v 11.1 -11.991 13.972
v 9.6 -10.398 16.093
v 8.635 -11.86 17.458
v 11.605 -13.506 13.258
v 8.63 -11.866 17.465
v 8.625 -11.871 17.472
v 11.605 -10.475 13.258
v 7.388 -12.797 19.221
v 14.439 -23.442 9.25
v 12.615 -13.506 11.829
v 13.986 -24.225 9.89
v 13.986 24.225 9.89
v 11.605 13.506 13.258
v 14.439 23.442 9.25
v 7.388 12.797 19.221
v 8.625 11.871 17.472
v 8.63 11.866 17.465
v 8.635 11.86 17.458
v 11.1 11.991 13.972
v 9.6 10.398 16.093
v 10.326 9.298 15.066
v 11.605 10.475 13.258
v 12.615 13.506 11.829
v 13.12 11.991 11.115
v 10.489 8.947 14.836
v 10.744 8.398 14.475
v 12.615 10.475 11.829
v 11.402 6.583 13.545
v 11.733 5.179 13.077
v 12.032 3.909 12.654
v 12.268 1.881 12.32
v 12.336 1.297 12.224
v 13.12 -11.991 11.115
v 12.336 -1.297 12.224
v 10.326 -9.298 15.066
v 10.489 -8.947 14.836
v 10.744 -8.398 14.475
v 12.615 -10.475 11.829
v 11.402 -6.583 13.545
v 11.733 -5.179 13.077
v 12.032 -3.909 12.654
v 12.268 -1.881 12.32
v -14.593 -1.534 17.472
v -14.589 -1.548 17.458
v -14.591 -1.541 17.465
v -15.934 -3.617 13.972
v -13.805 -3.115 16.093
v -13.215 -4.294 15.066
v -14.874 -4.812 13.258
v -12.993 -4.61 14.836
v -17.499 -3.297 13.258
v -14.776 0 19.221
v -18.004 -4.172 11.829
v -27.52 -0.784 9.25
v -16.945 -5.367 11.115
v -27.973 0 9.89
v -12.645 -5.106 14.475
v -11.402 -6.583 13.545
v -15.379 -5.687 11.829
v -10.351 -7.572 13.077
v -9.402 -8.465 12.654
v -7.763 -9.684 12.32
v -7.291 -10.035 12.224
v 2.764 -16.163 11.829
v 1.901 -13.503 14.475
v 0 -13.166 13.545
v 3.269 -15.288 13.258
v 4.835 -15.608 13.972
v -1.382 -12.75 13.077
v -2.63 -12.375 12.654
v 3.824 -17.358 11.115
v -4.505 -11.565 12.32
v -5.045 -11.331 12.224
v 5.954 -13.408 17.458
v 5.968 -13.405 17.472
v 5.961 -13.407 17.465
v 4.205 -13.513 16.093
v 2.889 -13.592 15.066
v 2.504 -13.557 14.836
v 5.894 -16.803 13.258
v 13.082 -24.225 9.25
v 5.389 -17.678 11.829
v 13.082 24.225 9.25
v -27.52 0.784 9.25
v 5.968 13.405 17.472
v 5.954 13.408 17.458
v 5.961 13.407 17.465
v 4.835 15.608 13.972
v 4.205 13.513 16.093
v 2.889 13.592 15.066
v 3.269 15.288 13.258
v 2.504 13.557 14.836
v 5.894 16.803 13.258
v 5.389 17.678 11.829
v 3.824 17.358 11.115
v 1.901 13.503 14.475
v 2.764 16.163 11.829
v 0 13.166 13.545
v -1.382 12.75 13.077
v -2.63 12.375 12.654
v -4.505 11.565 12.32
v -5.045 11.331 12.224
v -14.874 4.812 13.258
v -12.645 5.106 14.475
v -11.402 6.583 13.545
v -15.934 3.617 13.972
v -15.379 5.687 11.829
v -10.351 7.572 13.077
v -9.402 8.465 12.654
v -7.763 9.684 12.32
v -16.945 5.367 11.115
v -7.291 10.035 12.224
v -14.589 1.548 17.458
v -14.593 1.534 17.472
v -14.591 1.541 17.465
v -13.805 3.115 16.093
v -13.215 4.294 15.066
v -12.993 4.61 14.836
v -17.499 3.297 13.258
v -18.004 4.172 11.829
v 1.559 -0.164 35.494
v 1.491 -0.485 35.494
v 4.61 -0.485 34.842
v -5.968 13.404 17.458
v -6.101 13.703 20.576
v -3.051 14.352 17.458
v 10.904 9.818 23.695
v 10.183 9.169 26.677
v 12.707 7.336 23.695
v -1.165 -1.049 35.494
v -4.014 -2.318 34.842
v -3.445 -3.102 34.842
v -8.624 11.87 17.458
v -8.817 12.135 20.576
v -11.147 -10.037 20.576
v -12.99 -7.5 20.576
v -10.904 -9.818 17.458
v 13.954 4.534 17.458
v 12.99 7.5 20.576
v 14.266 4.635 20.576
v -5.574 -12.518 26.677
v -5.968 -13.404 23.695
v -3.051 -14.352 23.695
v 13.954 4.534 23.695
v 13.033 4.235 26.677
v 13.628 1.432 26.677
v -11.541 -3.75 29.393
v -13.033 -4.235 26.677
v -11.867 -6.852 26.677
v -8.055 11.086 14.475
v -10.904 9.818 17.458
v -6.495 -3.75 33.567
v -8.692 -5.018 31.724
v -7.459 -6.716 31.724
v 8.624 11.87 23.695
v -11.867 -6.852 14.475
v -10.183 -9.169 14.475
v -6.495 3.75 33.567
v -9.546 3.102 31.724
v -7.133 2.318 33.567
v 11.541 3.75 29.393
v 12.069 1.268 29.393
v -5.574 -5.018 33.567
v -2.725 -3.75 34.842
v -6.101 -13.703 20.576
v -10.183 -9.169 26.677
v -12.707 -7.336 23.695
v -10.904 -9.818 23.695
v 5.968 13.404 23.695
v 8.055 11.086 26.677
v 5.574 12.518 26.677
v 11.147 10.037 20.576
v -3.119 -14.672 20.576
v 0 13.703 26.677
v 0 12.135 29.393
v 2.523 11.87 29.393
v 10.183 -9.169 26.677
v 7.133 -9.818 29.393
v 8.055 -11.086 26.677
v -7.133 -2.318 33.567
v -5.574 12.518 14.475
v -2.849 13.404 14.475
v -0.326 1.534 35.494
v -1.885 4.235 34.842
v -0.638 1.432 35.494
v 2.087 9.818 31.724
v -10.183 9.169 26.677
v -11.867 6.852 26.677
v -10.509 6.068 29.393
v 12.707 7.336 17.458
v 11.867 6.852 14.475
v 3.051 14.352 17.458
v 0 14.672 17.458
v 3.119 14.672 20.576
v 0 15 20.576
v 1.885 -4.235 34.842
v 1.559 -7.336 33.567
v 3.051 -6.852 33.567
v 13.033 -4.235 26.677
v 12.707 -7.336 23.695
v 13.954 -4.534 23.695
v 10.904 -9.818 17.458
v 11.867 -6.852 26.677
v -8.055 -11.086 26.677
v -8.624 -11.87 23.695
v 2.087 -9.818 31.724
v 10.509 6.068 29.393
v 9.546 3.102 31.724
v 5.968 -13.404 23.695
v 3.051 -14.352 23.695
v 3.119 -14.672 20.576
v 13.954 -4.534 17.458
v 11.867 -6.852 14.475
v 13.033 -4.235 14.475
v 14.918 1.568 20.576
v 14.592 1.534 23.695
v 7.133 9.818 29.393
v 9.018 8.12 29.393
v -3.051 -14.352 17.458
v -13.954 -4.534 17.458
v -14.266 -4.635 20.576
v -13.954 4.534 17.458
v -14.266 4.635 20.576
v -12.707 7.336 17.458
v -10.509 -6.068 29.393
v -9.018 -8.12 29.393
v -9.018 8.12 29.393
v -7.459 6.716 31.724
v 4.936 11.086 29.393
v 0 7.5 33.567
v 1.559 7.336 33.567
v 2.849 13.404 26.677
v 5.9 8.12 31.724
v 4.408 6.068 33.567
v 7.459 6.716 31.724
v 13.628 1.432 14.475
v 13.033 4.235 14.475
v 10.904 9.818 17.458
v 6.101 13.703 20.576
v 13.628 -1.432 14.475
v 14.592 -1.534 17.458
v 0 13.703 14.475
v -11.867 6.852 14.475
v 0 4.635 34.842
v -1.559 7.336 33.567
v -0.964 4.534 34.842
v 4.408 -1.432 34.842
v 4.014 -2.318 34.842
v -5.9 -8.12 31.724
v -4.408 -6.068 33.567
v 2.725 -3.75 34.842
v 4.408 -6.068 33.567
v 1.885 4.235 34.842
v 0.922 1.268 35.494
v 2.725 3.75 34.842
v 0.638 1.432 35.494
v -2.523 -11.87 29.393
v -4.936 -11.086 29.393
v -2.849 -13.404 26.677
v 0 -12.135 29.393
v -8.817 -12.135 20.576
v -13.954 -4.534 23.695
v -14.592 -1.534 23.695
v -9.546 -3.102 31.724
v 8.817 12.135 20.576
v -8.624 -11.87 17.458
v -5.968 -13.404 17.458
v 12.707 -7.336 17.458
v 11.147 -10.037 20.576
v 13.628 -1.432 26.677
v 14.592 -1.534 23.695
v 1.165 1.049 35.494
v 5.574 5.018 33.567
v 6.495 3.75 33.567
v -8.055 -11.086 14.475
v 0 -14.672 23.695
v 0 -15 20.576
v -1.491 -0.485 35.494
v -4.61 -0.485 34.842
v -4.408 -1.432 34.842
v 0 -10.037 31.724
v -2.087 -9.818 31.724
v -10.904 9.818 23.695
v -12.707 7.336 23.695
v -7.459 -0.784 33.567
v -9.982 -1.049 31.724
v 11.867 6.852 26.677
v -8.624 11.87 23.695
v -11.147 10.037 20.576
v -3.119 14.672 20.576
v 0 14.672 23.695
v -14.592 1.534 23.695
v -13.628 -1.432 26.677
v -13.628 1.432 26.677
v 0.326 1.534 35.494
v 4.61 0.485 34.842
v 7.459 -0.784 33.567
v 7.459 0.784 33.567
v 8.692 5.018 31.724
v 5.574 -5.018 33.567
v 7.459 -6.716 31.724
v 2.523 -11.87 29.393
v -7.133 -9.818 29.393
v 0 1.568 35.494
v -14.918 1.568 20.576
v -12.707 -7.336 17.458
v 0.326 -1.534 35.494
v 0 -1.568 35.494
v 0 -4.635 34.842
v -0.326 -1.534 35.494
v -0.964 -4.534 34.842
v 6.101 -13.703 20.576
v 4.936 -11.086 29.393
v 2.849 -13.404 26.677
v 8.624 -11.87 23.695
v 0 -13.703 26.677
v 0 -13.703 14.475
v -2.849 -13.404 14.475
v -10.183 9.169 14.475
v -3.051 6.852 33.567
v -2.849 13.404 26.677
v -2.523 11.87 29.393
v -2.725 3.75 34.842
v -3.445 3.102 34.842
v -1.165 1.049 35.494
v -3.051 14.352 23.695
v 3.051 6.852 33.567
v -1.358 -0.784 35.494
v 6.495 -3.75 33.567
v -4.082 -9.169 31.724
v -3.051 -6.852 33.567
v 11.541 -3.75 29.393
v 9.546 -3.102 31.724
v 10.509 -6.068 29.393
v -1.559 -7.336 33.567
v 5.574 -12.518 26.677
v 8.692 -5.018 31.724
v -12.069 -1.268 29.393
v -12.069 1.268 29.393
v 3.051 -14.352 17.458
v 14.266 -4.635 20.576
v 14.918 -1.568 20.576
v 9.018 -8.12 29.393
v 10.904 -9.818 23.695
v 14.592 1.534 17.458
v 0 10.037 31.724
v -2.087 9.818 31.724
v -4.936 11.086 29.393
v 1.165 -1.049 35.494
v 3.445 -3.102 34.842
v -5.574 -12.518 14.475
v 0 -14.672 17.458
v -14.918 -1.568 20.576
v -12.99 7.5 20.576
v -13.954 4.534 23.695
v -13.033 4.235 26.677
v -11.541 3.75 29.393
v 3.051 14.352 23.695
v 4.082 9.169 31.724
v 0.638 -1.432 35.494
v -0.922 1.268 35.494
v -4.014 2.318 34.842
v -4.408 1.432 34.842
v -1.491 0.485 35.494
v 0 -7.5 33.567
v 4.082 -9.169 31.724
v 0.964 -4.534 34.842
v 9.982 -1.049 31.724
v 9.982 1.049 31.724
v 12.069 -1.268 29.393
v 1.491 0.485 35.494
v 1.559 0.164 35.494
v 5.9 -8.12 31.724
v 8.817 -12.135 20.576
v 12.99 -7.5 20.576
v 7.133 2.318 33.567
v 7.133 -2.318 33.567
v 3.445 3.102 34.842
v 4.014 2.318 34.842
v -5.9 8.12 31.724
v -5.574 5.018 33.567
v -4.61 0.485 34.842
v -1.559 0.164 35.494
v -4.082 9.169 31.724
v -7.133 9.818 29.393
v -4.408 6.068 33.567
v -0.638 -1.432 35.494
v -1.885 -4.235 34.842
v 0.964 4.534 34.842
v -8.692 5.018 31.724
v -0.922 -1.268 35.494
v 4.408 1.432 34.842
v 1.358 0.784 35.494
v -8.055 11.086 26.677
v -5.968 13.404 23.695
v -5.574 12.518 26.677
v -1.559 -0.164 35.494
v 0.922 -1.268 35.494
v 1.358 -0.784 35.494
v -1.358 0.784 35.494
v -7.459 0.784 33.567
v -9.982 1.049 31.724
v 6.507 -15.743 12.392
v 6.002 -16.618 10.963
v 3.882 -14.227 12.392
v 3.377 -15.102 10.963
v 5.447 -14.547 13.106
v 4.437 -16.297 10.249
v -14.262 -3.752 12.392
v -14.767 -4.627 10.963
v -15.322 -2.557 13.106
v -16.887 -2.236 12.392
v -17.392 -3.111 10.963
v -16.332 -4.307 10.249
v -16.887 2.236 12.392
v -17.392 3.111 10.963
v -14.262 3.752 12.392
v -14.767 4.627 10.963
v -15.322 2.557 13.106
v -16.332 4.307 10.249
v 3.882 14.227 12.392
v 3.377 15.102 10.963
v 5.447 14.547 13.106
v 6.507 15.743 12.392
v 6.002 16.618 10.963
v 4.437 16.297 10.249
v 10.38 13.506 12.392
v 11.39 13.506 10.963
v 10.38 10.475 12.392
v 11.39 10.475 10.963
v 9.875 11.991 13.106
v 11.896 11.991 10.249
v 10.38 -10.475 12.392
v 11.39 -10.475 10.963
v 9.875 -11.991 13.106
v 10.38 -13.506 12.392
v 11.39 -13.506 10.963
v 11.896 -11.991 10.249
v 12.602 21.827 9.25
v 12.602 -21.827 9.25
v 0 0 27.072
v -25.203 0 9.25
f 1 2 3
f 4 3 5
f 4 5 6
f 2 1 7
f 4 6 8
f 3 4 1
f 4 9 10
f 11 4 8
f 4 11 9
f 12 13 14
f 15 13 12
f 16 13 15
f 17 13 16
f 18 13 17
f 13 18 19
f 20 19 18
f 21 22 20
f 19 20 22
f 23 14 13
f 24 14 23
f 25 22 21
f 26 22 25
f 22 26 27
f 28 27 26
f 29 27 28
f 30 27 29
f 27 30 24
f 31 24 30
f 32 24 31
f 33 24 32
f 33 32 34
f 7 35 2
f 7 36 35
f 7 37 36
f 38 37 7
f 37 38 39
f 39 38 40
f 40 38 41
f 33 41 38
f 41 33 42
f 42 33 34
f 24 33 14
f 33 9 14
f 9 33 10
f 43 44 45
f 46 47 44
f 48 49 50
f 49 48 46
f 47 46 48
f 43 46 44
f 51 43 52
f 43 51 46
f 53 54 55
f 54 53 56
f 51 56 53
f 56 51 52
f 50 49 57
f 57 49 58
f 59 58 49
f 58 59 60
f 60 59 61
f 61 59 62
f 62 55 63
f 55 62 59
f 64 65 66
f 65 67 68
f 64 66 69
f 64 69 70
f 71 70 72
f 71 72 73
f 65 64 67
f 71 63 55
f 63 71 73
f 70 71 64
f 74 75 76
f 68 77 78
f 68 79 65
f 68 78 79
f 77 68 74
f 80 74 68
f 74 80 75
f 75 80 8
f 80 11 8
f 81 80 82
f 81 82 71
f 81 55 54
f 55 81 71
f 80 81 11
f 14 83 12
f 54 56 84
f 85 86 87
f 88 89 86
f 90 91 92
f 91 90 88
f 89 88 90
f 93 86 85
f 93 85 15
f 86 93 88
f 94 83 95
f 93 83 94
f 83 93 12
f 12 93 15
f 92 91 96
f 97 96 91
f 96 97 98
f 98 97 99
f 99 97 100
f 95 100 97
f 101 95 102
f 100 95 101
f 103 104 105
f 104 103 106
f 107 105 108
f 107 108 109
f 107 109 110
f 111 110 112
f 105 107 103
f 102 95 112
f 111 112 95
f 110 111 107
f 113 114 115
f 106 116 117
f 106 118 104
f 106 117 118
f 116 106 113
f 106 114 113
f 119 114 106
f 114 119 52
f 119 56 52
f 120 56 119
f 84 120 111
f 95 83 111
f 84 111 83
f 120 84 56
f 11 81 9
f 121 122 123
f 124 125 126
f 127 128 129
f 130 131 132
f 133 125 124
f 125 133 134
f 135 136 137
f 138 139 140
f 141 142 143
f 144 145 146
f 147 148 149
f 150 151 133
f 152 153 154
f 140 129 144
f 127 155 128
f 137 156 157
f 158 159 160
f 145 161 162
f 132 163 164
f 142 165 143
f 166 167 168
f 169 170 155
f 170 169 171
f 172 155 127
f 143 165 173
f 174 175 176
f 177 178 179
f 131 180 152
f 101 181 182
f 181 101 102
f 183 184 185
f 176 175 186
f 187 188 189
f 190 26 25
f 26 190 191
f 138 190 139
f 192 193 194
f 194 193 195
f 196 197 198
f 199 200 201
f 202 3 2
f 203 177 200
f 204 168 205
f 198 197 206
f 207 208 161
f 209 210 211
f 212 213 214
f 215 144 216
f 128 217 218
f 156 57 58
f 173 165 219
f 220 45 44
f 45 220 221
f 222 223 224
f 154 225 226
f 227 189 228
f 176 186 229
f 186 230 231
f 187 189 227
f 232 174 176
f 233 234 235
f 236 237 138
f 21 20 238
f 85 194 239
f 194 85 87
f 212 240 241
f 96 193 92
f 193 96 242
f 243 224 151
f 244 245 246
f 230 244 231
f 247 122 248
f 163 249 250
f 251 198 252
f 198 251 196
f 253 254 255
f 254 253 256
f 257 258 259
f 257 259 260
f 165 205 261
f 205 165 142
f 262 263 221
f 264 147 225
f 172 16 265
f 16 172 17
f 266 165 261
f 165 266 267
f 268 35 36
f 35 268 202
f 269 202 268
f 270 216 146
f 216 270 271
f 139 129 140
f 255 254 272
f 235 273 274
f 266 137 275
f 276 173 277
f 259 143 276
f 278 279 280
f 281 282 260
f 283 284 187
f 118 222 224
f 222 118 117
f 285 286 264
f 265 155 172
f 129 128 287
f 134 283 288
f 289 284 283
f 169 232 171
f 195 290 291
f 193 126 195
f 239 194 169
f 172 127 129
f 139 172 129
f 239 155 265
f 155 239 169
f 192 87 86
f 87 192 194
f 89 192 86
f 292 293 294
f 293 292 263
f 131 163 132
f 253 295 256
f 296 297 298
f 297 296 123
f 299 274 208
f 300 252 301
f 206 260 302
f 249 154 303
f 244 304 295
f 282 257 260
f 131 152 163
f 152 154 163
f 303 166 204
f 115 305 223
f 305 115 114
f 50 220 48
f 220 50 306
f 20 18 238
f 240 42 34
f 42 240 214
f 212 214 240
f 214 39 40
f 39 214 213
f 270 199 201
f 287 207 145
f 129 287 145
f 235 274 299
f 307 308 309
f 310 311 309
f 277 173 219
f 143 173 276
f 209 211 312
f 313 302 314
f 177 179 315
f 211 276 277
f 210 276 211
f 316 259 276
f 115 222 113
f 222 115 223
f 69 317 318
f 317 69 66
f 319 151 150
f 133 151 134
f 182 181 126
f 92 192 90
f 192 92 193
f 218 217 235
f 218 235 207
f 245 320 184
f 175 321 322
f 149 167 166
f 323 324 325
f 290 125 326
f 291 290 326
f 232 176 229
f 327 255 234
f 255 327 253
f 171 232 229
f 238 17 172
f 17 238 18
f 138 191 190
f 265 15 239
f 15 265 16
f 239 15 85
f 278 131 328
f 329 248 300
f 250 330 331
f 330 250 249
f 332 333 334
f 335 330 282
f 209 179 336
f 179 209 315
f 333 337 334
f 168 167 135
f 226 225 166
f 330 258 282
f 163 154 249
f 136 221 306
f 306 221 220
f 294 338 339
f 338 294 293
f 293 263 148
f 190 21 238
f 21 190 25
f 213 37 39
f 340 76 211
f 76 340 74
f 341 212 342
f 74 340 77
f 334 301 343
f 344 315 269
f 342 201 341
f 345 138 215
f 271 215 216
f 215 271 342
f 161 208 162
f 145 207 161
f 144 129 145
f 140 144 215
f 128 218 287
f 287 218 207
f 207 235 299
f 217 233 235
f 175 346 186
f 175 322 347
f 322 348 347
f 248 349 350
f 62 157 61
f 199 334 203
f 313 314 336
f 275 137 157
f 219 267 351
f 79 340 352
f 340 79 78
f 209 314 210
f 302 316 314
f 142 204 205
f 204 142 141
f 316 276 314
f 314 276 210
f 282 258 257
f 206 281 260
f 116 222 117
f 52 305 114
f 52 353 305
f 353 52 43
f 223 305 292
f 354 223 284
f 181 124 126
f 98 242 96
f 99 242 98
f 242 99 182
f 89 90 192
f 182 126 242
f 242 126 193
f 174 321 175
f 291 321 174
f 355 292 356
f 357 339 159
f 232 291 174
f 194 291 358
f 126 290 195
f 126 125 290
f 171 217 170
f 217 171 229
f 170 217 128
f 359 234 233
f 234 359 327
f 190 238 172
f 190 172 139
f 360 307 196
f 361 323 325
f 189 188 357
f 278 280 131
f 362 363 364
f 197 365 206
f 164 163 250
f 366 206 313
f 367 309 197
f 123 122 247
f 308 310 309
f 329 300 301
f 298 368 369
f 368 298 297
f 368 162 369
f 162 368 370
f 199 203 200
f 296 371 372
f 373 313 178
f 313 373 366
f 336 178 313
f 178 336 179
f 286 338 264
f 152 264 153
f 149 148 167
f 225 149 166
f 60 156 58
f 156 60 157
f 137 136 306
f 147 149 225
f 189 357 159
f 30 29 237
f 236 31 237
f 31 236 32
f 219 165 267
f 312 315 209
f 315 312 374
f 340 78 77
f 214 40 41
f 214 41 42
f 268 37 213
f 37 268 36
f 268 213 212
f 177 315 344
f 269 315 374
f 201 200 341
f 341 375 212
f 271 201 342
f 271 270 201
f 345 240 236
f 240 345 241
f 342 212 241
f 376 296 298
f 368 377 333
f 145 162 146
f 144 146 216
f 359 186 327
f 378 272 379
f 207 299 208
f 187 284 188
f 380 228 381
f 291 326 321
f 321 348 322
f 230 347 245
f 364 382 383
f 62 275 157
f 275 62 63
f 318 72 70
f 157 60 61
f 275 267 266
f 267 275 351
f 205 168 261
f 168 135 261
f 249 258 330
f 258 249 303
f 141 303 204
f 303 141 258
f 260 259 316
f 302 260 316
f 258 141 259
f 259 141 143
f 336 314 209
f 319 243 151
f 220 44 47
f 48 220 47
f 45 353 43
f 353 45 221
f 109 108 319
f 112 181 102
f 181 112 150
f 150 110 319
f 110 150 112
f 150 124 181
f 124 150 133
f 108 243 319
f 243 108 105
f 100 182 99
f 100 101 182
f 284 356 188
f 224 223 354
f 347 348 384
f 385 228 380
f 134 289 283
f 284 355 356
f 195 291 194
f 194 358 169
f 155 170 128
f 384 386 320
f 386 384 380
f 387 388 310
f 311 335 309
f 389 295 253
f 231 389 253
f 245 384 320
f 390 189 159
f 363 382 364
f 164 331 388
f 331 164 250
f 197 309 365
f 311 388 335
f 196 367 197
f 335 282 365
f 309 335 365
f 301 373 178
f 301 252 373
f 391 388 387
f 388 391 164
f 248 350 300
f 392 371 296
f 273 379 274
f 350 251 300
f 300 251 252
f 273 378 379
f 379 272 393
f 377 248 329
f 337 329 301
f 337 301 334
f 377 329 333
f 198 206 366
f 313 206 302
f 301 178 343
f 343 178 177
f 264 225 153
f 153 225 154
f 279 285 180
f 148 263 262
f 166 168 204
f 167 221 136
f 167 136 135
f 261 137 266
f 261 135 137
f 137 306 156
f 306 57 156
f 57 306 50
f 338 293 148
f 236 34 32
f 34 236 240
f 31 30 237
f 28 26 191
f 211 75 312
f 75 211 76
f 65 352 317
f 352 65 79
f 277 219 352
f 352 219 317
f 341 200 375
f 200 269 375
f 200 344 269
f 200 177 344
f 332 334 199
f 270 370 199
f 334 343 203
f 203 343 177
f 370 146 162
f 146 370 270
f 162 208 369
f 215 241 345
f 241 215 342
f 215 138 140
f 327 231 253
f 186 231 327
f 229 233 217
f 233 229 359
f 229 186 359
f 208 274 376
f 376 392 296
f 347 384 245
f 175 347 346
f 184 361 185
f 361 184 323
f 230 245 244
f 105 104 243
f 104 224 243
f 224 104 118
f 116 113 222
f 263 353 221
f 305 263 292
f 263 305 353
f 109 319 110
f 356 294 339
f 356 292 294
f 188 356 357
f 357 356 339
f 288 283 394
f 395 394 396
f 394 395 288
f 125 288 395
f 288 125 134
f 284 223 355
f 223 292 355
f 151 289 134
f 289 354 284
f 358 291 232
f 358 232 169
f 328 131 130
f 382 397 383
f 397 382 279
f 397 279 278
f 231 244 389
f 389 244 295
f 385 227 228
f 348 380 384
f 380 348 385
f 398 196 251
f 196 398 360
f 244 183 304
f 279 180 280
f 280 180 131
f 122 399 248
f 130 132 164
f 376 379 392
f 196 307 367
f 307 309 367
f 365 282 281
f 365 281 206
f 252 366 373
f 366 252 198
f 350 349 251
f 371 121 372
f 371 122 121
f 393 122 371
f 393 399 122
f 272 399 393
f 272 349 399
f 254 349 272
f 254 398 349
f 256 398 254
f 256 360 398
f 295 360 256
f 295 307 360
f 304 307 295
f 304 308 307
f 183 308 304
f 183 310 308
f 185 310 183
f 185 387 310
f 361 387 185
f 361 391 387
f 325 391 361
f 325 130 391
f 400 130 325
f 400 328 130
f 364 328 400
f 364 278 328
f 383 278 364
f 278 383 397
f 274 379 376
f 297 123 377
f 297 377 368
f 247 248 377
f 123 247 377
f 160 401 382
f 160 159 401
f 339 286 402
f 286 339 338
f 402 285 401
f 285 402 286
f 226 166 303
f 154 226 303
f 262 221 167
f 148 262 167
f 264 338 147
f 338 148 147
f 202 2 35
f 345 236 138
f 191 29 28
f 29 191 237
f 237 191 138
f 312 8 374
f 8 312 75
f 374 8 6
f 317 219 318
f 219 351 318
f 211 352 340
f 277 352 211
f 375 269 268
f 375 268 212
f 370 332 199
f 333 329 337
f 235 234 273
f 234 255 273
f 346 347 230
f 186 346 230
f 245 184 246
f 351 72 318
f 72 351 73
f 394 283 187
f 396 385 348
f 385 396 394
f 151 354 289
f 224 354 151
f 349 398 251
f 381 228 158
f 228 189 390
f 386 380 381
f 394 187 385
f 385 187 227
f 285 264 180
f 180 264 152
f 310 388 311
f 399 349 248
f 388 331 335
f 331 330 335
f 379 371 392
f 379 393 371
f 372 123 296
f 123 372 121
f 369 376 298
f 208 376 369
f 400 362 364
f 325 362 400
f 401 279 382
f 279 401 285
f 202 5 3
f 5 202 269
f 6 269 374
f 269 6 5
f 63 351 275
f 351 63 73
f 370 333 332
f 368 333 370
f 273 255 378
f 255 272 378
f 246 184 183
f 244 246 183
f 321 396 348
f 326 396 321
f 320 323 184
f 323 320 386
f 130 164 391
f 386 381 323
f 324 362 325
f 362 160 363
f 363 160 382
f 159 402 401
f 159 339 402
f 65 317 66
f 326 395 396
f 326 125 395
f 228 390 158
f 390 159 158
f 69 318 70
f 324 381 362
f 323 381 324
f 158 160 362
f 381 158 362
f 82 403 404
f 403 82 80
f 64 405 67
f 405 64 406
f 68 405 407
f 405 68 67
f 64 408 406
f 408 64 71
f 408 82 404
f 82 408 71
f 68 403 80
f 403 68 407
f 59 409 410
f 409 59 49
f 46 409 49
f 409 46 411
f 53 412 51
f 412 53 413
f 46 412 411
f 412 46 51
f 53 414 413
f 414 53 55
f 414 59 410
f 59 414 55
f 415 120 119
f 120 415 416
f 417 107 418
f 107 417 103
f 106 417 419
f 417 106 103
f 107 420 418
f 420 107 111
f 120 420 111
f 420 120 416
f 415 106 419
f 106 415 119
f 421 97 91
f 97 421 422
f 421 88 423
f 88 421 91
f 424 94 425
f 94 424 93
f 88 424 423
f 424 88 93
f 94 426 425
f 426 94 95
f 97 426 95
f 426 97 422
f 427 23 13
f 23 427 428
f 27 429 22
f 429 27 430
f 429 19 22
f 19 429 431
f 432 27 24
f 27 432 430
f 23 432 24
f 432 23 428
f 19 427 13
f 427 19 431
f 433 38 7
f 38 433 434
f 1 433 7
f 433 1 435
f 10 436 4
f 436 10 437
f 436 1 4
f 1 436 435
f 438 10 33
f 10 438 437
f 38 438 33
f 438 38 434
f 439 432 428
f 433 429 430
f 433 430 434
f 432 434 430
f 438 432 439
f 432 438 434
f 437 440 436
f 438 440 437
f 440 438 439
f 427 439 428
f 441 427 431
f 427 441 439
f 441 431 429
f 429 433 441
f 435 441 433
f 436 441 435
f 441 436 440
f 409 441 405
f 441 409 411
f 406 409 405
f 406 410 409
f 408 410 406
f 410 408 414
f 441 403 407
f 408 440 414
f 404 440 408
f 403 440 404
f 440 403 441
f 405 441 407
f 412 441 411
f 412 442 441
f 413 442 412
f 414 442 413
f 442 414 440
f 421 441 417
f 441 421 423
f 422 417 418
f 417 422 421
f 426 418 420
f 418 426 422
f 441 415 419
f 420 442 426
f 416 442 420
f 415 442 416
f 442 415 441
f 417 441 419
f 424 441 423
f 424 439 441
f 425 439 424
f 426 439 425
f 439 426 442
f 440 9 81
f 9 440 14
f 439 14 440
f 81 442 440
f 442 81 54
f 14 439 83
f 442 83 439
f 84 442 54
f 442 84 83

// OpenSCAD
r = 15;    // [ 10 : 40 ] 
t = 1.5;	  // [ 0.5 : 3.0 ]
s = 3.5;   // [ 0.0 : 6.0 ]
so = 0.00; // [ 0.0 : 0.2 ]
m = 0.85; // [ 0.7 : 1.0 ]
c = r/sin(45)/0.725+s+t;

echo( c );

intersection()
{
rotate( [ 45, -asin( 1 / sqrt( 3 ) ), 0 ] )
difference()
{
	union()
	{
		cube( [ c, c, c ], center = true );
		translate( [ 1, 1, 1 ]*(c/2+r/2-r*m) )
			rotate( [ -asin( 1 / sqrt( 3 ) ), 45, 0 ] )
		//	rotate( [ 180, 0, 90 ] )
		//	cylinder( r1 = r, r2 = 0, h = r*2, $fn = 3 );
			sphere( r = r, center = true );

	}

		rotate( [ 0, 0, 0 ] )
			translate( [ 0, 0, 1 ] * c/2 ) rotate( [ 0, 0, 45 ] )
				translate( [ 1,0, 0 ] * (t+s*0.5) )
					for ( a = [ -1, +1 ] ) translate( (a+so)*[0,1,0] * c/2*0.7 )
					cylinder( r = s/2, h = c, center = true );
		rotate( [ 270, 0, 0 ] )
			translate( [ 0, 0, 1 ] * c/2 ) rotate( [ 0, 0, 270+45 ] )
				translate( [ 1,0, 0 ] * (t+s*0.5) )   
					for ( a = [ -1, +1 ] ) translate( (a+so)*[0,1,0] * c/2*0.7 )				cylinder( r = s/2, h = c, center = true );
		rotate( [ 0, 90, 0 ] )
			translate( [ 0, 0, 1 ] * c/2 ) rotate( [ 0, 0, 90+45 ] )
				translate( [ 1,0, 0 ] * (t+s*0.5) )   
					for ( a = [ -1, +1 ] ) translate( (a+so)*[0,1,0] * c/2*0.7 )					cylinder( r = s/2, h = c, center = true );

	cube( [ c-t*2, c-t*2, c-t*2 ], center = true );
}
translate( [ 0, 0, c*0.27+100 ] ) cube( 200, center = true );
}

/*
difference()
{
	union()
	{
		translate( [ 0, 0, h ] )
			sphere( r = r, center = true );
		translate( [ 0, 0, h/2 ] )
			cylinder( r1 = r2, r2 = 0, h = h, center = true, $fn = 3 );
	}

	translate( [ 0, 0, h/2-d*sqrt(2) ] )
		cylinder( r1 = r2, r2 = 0, h = h, center = true, $fn = 3 );

	for ( a = [ 0, 120, 240 ] ) rotate( a+60, [ 0, 0, 1 ] )
		translate( [ r2*cos(60), 0, 0 ] )
			rotate( [ 0, 60, 0 ] )
				translate( [ -1.25*s, 0, 0 ] )
			cylinder( r = s/2, h = d*3, center = true );
}
*/

/*
//rotate( [ 45, 0, 0 ] ) rotate( 30, [ 0, 1, -1 ] )
{color( "red" ) cube( [ 50, 0.1, 0.1 ], center = true );
color( "green" ) cube( [ 0.1, 50, 0.1 ], center = true );
color( "blue" ) cube( [ 0.1, 0.1, 50 ], center = true );
}
//translate( [ 3, 0, 0 ] )
//rotate( [ 45, 0, 0 ] ) rotate( 33, [ 0, 1, -1 ] )
//translate( [ 4, -5, -5 ] )
color( "snow" ) cube( 20, center = true );
*/
